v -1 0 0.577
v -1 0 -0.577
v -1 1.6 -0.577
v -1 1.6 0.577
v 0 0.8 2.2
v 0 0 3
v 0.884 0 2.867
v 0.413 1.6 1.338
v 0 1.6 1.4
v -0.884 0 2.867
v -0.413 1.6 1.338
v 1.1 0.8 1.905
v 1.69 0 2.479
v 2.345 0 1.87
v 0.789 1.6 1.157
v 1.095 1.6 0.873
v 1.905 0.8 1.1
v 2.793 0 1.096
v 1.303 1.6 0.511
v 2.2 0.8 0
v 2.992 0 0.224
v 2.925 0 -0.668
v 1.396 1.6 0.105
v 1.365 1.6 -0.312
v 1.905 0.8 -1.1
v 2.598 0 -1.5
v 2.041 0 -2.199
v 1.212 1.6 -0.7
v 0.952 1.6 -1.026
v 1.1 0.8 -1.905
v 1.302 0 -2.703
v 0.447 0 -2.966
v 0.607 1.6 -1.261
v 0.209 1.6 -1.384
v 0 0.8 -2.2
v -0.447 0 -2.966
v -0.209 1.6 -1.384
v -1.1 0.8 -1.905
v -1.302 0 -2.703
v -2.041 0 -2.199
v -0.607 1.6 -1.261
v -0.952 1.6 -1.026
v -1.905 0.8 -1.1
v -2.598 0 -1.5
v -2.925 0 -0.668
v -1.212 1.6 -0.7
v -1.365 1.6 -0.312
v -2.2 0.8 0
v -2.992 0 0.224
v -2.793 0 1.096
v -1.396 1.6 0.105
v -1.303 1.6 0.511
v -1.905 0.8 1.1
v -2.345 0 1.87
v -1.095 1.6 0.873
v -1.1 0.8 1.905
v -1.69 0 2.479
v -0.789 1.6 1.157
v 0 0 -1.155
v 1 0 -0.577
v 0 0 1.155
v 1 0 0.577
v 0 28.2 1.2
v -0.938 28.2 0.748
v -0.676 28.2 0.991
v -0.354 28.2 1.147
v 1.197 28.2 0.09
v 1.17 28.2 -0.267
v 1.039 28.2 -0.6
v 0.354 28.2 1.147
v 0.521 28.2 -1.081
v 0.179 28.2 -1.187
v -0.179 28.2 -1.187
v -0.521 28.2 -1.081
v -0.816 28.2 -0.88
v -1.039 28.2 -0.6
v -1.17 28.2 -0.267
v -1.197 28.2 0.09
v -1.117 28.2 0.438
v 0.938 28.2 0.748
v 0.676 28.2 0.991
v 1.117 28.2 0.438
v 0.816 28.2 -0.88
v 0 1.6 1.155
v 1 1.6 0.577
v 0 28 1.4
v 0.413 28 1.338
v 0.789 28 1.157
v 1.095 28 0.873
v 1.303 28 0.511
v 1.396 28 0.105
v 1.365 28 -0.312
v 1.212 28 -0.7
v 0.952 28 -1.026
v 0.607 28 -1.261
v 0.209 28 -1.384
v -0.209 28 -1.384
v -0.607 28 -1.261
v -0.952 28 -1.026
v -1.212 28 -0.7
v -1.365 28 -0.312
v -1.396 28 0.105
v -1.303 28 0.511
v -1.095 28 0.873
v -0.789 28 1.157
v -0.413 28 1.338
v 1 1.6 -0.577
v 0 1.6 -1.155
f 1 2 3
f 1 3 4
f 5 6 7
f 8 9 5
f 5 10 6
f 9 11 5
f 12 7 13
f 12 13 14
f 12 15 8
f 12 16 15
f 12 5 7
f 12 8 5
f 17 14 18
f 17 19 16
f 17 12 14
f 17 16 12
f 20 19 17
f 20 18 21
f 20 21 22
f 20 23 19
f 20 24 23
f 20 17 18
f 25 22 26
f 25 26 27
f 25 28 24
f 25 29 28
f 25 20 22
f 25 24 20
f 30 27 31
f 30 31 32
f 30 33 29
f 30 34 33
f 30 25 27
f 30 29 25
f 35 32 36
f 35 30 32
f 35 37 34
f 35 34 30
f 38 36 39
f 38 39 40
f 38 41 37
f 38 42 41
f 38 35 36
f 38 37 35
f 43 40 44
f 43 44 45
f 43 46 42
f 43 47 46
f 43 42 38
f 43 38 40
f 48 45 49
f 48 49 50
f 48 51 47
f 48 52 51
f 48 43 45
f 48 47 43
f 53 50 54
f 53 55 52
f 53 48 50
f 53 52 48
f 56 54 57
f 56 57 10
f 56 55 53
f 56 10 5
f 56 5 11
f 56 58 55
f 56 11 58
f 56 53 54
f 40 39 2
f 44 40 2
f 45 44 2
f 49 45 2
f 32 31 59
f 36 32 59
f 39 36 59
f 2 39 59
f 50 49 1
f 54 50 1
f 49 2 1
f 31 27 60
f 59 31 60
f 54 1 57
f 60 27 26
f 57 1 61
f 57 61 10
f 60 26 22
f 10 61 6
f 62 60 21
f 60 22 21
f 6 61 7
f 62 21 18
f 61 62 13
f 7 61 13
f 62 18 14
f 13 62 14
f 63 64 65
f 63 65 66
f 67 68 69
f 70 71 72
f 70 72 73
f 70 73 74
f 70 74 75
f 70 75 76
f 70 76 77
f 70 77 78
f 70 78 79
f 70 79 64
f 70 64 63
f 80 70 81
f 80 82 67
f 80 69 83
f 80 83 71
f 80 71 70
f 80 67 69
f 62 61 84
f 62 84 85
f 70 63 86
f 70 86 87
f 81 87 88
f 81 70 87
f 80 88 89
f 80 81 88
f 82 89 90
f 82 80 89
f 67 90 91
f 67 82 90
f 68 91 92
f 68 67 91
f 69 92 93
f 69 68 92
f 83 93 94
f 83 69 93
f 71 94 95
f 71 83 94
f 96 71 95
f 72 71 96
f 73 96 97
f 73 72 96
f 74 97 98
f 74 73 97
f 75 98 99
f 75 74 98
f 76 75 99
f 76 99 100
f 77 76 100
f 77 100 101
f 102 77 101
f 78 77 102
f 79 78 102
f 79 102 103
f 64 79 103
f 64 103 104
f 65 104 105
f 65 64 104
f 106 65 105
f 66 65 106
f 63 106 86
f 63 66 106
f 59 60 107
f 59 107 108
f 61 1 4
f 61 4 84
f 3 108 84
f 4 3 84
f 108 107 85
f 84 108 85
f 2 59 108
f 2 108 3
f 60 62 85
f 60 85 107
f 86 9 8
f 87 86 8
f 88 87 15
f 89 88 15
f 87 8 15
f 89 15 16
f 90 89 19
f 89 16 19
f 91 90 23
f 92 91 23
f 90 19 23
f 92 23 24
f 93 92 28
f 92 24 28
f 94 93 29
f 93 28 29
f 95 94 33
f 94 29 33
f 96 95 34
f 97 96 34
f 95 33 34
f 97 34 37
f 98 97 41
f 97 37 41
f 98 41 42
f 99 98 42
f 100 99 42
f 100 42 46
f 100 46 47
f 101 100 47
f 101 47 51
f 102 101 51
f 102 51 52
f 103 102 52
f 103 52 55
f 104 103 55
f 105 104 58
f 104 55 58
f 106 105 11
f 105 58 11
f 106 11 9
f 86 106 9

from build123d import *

# Parameters (mm, degrees)
SKETCH_1_R      = 3
EXTRUDE_1_DEPTH = 1.6
CHAMFER_1_SIZE  = 1.6
SKETCH_2_R      = 1.4
EXTRUDE_2_DEPTH = 26.6
CHAMFER_2_SIZE  = 0.2


with BuildPart() as part:
    # 草图1 → 凸台-拉伸1 (new body)
    with BuildSketch(Plane(origin=(0, 0, 0), x_dir=(1, 0, 0), z_dir=(0, 1, 0))):
        with Locations(Location((0, 0, 0), (0, 0, 270))):
            Circle(SKETCH_1_R)
        Polygon((0, -1.154700538), (1, -0.577350269), (1, 0.577350269), (0, 1.154700538), (-1, 0.577350269), (-1, -0.577350269), align=None, mode=Mode.SUBTRACT)
    extrude(amount=EXTRUDE_1_DEPTH)

    # 倒角1
    # the kernel refuses this chamfer: 1.6 mm, written as the material it takes off along each edge
    with BuildSketch(Plane(origin=(0, 1.6, 0), x_dir=(0, 0, 1), z_dir=(-1, 0, 0))) as chamfer_1_piece_1:
        Polygon((3, -CHAMFER_1_SIZE), (3 - CHAMFER_1_SIZE, 0), (3, 0), align=None)
    revolve(axis=Axis((0, 1.6, 0), (0, 1, 0)), mode=Mode.SUBTRACT)

    # 草图2 → 凸台-拉伸2 (add)
    with BuildSketch(Plane(origin=(0, 1.6, 0), x_dir=(1, 0, 0), z_dir=(0, 1, 0))):
        with Locations(Location((0, 0, 0), (0, 0, 270))):
            Circle(SKETCH_2_R)
    extrude(amount=EXTRUDE_2_DEPTH)

    # 倒角2
    chamfer_2_edges = [part.edges().sort_by_distance(p)[0] for p in [
        (0, 28.2, -1.4),
    ]]
    chamfer(chamfer_2_edges, length=CHAMFER_2_SIZE)


solid = part.part
